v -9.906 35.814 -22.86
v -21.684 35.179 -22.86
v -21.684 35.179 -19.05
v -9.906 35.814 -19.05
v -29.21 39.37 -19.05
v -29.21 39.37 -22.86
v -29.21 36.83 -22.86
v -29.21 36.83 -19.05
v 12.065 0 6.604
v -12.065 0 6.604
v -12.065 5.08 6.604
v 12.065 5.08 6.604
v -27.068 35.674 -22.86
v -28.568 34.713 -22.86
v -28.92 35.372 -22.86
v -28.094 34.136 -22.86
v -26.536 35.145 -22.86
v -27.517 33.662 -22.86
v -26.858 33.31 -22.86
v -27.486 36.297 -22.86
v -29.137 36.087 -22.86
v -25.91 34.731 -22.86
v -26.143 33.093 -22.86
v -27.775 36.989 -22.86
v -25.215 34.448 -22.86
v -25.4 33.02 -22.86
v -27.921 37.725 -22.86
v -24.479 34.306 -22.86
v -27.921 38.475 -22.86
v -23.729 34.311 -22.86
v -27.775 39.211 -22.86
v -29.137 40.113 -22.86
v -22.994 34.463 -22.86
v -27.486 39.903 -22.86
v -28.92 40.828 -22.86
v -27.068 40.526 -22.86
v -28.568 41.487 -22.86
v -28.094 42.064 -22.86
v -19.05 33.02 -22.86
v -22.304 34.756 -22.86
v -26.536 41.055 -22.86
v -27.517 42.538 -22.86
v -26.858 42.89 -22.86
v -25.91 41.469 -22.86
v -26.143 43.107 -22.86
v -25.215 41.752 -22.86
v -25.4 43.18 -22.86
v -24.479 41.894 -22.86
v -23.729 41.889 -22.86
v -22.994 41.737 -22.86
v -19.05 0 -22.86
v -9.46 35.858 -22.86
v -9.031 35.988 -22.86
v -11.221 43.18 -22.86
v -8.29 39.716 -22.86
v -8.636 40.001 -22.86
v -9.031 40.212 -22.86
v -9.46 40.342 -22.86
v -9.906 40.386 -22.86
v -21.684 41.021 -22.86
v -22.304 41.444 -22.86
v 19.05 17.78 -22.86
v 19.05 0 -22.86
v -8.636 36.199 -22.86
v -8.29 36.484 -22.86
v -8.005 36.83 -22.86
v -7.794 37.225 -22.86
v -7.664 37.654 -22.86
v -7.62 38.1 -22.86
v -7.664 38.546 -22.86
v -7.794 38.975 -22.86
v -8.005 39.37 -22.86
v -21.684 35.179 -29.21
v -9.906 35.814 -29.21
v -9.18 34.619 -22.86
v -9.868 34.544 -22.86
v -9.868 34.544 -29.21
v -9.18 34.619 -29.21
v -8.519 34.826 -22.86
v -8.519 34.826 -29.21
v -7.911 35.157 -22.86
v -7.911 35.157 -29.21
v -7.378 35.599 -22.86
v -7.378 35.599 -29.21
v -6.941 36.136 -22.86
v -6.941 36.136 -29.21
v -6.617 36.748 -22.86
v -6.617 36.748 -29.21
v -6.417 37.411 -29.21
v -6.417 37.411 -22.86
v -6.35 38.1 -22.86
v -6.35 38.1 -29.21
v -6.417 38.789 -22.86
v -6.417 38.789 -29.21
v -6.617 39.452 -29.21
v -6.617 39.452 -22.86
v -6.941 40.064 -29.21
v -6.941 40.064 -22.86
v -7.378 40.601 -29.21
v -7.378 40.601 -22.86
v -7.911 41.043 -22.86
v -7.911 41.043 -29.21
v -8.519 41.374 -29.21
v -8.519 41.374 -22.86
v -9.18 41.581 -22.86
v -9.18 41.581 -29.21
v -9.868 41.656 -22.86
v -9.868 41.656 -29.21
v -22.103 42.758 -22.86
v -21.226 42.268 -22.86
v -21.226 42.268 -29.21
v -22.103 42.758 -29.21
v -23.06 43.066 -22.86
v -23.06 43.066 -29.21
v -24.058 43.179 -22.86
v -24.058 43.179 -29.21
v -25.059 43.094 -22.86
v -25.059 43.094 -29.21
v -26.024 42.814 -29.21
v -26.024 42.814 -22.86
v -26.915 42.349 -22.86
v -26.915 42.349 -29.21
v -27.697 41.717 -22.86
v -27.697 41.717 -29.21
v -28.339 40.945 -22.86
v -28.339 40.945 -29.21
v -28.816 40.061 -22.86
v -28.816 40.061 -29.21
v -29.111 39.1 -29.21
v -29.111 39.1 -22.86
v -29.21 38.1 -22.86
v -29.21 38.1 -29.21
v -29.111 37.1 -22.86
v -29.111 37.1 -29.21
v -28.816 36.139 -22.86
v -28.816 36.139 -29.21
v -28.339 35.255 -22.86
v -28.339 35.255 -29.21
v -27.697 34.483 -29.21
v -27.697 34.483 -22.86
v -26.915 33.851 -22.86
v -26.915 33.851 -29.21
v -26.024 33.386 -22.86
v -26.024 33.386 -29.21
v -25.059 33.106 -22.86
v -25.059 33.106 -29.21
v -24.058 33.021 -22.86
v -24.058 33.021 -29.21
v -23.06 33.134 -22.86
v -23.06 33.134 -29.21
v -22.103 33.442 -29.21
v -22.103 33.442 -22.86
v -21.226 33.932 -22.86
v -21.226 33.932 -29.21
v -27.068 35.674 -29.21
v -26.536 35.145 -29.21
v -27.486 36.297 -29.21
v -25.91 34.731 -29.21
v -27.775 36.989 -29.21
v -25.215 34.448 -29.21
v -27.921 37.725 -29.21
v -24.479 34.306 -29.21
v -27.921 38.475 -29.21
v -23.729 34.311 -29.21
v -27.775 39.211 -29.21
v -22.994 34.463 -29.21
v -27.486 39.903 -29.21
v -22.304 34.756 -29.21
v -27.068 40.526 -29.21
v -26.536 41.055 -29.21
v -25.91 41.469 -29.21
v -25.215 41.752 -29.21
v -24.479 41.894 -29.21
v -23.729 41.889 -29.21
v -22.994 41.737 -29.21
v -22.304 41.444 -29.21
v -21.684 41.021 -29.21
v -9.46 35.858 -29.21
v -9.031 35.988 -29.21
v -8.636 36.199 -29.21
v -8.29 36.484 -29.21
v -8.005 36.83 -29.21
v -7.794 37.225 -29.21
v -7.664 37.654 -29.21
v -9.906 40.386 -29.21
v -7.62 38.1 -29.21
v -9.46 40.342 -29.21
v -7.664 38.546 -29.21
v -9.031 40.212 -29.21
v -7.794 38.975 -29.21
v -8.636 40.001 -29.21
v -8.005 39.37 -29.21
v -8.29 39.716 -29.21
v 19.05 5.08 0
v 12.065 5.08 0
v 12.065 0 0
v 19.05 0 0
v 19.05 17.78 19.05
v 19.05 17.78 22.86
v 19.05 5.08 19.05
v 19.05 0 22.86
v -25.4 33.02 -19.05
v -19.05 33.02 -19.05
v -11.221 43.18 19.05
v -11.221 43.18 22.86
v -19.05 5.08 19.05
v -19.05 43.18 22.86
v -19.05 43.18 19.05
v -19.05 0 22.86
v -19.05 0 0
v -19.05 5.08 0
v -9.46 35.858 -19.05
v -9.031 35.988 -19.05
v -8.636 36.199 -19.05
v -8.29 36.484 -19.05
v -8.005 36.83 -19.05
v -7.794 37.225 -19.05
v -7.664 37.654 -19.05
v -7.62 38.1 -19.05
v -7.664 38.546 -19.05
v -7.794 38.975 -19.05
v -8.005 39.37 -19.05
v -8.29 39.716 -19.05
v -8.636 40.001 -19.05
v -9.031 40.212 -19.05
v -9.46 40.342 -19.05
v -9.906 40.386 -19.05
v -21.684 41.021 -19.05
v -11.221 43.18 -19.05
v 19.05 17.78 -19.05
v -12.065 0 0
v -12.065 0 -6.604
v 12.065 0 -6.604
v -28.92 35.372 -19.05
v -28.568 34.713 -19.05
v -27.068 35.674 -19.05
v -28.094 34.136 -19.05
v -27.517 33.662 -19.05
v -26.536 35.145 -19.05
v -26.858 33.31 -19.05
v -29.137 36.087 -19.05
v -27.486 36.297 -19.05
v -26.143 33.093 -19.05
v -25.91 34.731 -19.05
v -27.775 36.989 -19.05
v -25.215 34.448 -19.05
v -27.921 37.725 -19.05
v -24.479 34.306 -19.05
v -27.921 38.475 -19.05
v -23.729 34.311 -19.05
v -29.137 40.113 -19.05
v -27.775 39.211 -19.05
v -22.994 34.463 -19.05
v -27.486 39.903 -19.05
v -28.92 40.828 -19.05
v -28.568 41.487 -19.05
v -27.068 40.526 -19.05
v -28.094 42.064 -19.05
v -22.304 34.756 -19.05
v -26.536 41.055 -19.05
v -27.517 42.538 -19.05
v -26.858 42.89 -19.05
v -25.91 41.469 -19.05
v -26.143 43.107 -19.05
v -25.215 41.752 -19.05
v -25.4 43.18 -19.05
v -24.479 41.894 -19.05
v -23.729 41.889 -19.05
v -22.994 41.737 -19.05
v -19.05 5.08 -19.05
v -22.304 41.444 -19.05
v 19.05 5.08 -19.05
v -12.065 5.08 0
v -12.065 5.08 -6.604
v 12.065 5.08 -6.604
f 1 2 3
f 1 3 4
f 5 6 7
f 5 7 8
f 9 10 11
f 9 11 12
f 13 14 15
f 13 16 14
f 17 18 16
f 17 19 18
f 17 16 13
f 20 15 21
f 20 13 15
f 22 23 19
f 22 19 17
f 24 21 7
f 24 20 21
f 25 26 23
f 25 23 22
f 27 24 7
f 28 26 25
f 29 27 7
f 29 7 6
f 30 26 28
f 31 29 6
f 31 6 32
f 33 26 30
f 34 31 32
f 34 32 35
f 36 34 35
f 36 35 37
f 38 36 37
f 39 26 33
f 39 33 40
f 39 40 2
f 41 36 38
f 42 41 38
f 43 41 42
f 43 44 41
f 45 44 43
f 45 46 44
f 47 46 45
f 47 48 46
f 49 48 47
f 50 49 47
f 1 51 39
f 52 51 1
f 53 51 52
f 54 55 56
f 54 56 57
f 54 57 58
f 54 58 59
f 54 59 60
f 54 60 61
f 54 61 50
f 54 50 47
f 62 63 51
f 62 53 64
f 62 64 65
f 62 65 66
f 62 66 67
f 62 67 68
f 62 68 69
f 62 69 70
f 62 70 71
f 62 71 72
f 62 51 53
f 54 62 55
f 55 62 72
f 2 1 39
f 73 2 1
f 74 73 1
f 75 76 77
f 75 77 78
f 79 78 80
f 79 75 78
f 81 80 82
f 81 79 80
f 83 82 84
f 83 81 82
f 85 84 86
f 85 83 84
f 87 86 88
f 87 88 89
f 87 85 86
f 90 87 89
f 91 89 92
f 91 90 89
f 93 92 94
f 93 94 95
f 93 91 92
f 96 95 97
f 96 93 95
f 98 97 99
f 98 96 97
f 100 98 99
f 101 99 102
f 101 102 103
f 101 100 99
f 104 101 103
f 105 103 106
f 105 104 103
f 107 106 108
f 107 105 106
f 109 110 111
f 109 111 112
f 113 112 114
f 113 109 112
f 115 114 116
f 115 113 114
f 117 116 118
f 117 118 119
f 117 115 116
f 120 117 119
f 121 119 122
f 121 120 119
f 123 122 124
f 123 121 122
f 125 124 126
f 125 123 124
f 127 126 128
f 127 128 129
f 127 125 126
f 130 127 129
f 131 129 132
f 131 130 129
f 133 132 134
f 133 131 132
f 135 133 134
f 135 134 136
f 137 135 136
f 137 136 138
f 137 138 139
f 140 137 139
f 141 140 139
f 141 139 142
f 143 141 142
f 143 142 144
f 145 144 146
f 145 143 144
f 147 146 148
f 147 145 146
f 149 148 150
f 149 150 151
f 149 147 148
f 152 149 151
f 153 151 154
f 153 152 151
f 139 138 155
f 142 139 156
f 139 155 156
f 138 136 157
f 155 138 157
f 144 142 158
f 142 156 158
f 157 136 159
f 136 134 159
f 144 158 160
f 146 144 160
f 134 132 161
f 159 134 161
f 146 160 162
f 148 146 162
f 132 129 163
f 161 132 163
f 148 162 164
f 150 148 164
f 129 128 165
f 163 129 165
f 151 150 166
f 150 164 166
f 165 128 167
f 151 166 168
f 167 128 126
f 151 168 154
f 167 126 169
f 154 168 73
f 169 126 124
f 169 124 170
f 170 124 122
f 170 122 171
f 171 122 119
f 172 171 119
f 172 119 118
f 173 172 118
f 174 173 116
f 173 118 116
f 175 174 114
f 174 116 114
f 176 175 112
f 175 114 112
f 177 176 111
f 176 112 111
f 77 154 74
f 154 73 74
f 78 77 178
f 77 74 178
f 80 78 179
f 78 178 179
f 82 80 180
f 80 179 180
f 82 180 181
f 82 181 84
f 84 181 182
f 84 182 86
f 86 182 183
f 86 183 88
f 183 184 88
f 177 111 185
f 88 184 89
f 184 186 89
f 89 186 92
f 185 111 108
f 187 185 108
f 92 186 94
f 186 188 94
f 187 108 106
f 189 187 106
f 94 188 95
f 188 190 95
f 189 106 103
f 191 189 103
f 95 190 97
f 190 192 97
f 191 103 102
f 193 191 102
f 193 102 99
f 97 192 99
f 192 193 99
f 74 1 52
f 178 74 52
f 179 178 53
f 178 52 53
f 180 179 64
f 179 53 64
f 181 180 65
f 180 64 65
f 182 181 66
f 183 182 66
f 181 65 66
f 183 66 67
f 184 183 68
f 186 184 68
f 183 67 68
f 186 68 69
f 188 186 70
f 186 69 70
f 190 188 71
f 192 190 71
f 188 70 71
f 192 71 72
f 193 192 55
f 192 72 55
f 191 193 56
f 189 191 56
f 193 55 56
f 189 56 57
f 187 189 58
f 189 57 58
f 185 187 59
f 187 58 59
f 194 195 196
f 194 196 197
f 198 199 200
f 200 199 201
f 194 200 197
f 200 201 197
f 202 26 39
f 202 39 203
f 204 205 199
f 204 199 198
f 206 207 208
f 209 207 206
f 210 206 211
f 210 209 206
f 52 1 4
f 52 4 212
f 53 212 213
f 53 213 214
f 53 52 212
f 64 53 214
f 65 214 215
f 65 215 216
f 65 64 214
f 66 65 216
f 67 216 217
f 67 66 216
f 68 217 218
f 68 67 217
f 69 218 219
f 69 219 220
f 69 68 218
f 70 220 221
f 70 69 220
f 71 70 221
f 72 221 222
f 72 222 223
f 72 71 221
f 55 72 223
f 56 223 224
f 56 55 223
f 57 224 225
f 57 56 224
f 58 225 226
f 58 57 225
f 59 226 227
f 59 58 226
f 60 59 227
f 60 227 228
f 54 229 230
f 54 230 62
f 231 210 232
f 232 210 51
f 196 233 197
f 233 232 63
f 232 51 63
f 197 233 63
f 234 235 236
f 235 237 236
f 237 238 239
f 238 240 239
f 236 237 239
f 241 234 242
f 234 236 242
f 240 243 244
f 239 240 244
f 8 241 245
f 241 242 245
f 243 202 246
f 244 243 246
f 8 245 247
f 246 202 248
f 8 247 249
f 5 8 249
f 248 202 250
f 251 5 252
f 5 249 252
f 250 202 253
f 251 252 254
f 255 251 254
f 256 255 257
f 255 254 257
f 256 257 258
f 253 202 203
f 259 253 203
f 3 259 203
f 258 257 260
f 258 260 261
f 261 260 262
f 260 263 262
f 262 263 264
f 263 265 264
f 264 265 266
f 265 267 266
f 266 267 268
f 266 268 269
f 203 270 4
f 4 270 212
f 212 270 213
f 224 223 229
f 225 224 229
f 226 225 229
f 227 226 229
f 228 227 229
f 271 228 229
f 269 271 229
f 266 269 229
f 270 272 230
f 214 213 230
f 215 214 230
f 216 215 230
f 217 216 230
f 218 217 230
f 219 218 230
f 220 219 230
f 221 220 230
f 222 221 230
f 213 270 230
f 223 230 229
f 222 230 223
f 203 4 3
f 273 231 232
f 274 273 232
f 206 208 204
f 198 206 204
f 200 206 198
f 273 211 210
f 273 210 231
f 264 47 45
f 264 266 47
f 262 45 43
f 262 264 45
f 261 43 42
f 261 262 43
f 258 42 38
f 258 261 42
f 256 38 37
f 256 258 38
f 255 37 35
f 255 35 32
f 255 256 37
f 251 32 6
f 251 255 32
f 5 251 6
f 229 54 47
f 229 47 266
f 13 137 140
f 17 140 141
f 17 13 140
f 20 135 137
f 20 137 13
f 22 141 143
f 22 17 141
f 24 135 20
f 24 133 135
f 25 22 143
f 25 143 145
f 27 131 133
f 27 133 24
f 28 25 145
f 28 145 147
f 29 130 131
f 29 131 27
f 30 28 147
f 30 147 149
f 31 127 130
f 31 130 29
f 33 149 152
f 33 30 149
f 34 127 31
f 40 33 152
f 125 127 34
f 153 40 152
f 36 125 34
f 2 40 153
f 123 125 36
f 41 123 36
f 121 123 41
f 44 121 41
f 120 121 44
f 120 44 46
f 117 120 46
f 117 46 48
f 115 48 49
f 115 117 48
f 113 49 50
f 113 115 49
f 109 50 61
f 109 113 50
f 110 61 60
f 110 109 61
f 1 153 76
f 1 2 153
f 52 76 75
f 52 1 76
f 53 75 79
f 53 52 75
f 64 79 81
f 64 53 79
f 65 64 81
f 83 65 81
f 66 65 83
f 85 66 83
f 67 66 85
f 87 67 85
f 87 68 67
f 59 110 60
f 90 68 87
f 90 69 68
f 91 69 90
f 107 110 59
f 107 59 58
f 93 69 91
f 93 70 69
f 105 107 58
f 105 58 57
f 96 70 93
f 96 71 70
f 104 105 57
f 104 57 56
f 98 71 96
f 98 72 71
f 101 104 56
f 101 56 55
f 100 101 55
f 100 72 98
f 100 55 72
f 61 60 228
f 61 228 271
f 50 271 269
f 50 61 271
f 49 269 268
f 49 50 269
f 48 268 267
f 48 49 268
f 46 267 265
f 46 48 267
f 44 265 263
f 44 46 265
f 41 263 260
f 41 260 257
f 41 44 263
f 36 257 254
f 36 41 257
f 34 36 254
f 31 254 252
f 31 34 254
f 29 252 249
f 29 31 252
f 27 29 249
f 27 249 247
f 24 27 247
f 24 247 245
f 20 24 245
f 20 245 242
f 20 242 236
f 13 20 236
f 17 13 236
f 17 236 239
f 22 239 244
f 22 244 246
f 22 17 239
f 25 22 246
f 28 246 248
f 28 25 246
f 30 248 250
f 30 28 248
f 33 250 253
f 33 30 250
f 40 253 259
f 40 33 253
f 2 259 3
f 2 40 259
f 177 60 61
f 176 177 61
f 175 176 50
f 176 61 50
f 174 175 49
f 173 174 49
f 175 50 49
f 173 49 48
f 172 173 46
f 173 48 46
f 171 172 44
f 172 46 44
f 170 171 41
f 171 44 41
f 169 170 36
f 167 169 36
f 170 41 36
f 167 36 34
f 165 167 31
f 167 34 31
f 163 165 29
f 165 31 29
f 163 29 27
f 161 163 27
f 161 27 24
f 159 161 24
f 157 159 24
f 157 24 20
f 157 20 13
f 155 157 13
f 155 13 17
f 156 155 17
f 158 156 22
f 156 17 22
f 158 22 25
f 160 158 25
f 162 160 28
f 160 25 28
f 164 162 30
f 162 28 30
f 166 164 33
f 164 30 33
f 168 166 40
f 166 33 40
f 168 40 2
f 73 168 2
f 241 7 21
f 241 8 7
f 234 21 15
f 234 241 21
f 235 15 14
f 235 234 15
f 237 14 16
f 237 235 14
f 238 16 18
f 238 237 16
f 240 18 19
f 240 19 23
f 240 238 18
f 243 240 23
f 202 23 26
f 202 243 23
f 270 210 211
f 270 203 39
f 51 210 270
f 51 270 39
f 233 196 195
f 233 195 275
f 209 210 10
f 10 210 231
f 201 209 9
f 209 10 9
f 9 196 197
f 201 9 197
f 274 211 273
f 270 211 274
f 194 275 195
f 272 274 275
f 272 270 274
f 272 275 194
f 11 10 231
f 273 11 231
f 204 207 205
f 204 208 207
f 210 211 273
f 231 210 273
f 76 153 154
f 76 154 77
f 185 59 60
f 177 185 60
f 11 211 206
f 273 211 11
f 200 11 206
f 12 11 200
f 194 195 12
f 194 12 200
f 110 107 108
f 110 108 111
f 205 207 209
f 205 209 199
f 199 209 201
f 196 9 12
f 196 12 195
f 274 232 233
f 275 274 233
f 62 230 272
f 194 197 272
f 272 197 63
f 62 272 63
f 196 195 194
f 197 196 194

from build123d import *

# Parameters (mm, degrees)
SKETCH1_W           = 38.1
SKETCH1_H           = 45.72
SKETCH1_W_2         = 24.13
SKETCH1_H_2         = 13.208
BOSS_EXTRUDE1_DEPTH = 5.08
SKETCH2_W           = 38.1
SKETCH2_H           = 3.81
BOSS_EXTRUDE2_DEPTH = 38.1
CHAMFER1_SIZE       = 25.4
CHAMFER1_SIZE2      = 30.270541252
SKETCH3_W           = 3.81
SKETCH3_H           = 10.16
BOSS_EXTRUDE3_DEPTH = 10.16
FILLET1_R           = 3.81
EXTRUDE_THIN2_DEPTH = 6.35
CUT_EXTRUDE3_DEPTH  = 3.81


with BuildPart() as part:
    # Sketch1 → Boss-Extrude1 (new body)
    with BuildSketch(Plane(origin=(0, 0, 0), x_dir=(1, 0, 0), z_dir=(0, 1, 0))):
        Rectangle(SKETCH1_W, SKETCH1_H)
        Rectangle(SKETCH1_W_2, SKETCH1_H_2, mode=Mode.SUBTRACT)
    extrude(amount=BOSS_EXTRUDE1_DEPTH)

    # Sketch2 → Boss-Extrude2 (add)
    with BuildSketch(Plane(origin=(0, 5.08, 0), x_dir=(1, 0, 0), z_dir=(0, 1, 0))):
        with Locations((0, 20.955)):
            Rectangle(SKETCH2_W, SKETCH2_H)
        with Locations((0, -20.955)):
            Rectangle(SKETCH2_W, SKETCH2_H)
    extrude(amount=BOSS_EXTRUDE2_DEPTH)

    # Chamfer1
    chamfer1_edges = [part.edges().sort_by_distance(p)[0] for p in [
        (19.05, 43.18, -20.955),
        (19.05, 43.18, 20.955),
    ]]
    chamfer1_side = [part.faces().sort_by_distance(p)[0] for p in [
        (19.05, 21.59, 22.231125545),
    ]]
    chamfer(chamfer1_edges, length=CHAMFER1_SIZE, length2=CHAMFER1_SIZE2, reference=chamfer1_side[0])

    # Sketch3 → Boss-Extrude3 (add)
    with BuildSketch(Plane.ZY.offset(19.05)):
        with Locations((-20.955, 38.1)):
            Rectangle(SKETCH3_W, SKETCH3_H)
    extrude(amount=BOSS_EXTRUDE3_DEPTH)

    # Fillet1
    fillet1_edges = [part.edges().sort_by_distance(p)[0] for p in [
        (-29.21, 33.02, -20.955),
        (-29.21, 43.18, -20.955),
    ]]
    fillet(fillet1_edges, radius=FILLET1_R)

    # Sketch6 → Cut-Extrude3 (cut)
    with BuildSketch(Plane(origin=(0, 0, -22.86), x_dir=(-1, 0, 0), z_dir=(0, 0, -1))):
        with BuildLine():
            Line((9.906, 40.386), (21.683807244, 41.021))
            ThreePointArc((21.683807244, 41.021), (27.94, 38.1), (21.683807244, 35.179))
            Line((21.683807244, 35.179), (9.906, 35.814))
            ThreePointArc((9.906, 35.814), (7.62, 38.1), (9.906, 40.386))
        make_face()
    extrude(amount=-CUT_EXTRUDE3_DEPTH, mode=Mode.SUBTRACT)


with BuildPart() as body_2:
    # Sketch4 → Extrude-Thin2 (new body)
    with BuildSketch(Plane(origin=(0, 0, -22.86), x_dir=(-1, 0, 0), z_dir=(0, 0, -1))):
        with BuildLine():
            Line((9.868028508, 41.655797262), (21.226072609, 42.268165749))
            ThreePointArc((21.226072609, 42.268165749), (29.21, 38.1), (21.226072609, 33.931834251))
            Line((21.226072609, 33.931834251), (9.868028508, 34.544202738))
            ThreePointArc((9.868028508, 34.544202738), (6.35, 38.1), (9.868028508, 41.655797262))
        make_face()
        with BuildLine():
            Line((9.906, 40.386), (21.683807244, 41.021))
            ThreePointArc((21.683807244, 41.021), (27.94, 38.1), (21.683807244, 35.179))
            Line((21.683807244, 35.179), (9.906, 35.814))
            ThreePointArc((9.906, 35.814), (7.62, 38.1), (9.906, 40.386))
        make_face(mode=Mode.SUBTRACT)
    extrude(amount=EXTRUDE_THIN2_DEPTH)


with BuildPart() as body_3:
    # Split1: the piece on the far side of the plane
    add(part.part)
    split(bisect_by=Plane.XY, keep=Keep.BOTTOM)


with BuildPart() as part_1:
    add(part.part)

    # Split1
    split(bisect_by=Plane.XY, keep=Keep.TOP)


solid = Compound([body_2.part, body_3.part, part_1.part])
